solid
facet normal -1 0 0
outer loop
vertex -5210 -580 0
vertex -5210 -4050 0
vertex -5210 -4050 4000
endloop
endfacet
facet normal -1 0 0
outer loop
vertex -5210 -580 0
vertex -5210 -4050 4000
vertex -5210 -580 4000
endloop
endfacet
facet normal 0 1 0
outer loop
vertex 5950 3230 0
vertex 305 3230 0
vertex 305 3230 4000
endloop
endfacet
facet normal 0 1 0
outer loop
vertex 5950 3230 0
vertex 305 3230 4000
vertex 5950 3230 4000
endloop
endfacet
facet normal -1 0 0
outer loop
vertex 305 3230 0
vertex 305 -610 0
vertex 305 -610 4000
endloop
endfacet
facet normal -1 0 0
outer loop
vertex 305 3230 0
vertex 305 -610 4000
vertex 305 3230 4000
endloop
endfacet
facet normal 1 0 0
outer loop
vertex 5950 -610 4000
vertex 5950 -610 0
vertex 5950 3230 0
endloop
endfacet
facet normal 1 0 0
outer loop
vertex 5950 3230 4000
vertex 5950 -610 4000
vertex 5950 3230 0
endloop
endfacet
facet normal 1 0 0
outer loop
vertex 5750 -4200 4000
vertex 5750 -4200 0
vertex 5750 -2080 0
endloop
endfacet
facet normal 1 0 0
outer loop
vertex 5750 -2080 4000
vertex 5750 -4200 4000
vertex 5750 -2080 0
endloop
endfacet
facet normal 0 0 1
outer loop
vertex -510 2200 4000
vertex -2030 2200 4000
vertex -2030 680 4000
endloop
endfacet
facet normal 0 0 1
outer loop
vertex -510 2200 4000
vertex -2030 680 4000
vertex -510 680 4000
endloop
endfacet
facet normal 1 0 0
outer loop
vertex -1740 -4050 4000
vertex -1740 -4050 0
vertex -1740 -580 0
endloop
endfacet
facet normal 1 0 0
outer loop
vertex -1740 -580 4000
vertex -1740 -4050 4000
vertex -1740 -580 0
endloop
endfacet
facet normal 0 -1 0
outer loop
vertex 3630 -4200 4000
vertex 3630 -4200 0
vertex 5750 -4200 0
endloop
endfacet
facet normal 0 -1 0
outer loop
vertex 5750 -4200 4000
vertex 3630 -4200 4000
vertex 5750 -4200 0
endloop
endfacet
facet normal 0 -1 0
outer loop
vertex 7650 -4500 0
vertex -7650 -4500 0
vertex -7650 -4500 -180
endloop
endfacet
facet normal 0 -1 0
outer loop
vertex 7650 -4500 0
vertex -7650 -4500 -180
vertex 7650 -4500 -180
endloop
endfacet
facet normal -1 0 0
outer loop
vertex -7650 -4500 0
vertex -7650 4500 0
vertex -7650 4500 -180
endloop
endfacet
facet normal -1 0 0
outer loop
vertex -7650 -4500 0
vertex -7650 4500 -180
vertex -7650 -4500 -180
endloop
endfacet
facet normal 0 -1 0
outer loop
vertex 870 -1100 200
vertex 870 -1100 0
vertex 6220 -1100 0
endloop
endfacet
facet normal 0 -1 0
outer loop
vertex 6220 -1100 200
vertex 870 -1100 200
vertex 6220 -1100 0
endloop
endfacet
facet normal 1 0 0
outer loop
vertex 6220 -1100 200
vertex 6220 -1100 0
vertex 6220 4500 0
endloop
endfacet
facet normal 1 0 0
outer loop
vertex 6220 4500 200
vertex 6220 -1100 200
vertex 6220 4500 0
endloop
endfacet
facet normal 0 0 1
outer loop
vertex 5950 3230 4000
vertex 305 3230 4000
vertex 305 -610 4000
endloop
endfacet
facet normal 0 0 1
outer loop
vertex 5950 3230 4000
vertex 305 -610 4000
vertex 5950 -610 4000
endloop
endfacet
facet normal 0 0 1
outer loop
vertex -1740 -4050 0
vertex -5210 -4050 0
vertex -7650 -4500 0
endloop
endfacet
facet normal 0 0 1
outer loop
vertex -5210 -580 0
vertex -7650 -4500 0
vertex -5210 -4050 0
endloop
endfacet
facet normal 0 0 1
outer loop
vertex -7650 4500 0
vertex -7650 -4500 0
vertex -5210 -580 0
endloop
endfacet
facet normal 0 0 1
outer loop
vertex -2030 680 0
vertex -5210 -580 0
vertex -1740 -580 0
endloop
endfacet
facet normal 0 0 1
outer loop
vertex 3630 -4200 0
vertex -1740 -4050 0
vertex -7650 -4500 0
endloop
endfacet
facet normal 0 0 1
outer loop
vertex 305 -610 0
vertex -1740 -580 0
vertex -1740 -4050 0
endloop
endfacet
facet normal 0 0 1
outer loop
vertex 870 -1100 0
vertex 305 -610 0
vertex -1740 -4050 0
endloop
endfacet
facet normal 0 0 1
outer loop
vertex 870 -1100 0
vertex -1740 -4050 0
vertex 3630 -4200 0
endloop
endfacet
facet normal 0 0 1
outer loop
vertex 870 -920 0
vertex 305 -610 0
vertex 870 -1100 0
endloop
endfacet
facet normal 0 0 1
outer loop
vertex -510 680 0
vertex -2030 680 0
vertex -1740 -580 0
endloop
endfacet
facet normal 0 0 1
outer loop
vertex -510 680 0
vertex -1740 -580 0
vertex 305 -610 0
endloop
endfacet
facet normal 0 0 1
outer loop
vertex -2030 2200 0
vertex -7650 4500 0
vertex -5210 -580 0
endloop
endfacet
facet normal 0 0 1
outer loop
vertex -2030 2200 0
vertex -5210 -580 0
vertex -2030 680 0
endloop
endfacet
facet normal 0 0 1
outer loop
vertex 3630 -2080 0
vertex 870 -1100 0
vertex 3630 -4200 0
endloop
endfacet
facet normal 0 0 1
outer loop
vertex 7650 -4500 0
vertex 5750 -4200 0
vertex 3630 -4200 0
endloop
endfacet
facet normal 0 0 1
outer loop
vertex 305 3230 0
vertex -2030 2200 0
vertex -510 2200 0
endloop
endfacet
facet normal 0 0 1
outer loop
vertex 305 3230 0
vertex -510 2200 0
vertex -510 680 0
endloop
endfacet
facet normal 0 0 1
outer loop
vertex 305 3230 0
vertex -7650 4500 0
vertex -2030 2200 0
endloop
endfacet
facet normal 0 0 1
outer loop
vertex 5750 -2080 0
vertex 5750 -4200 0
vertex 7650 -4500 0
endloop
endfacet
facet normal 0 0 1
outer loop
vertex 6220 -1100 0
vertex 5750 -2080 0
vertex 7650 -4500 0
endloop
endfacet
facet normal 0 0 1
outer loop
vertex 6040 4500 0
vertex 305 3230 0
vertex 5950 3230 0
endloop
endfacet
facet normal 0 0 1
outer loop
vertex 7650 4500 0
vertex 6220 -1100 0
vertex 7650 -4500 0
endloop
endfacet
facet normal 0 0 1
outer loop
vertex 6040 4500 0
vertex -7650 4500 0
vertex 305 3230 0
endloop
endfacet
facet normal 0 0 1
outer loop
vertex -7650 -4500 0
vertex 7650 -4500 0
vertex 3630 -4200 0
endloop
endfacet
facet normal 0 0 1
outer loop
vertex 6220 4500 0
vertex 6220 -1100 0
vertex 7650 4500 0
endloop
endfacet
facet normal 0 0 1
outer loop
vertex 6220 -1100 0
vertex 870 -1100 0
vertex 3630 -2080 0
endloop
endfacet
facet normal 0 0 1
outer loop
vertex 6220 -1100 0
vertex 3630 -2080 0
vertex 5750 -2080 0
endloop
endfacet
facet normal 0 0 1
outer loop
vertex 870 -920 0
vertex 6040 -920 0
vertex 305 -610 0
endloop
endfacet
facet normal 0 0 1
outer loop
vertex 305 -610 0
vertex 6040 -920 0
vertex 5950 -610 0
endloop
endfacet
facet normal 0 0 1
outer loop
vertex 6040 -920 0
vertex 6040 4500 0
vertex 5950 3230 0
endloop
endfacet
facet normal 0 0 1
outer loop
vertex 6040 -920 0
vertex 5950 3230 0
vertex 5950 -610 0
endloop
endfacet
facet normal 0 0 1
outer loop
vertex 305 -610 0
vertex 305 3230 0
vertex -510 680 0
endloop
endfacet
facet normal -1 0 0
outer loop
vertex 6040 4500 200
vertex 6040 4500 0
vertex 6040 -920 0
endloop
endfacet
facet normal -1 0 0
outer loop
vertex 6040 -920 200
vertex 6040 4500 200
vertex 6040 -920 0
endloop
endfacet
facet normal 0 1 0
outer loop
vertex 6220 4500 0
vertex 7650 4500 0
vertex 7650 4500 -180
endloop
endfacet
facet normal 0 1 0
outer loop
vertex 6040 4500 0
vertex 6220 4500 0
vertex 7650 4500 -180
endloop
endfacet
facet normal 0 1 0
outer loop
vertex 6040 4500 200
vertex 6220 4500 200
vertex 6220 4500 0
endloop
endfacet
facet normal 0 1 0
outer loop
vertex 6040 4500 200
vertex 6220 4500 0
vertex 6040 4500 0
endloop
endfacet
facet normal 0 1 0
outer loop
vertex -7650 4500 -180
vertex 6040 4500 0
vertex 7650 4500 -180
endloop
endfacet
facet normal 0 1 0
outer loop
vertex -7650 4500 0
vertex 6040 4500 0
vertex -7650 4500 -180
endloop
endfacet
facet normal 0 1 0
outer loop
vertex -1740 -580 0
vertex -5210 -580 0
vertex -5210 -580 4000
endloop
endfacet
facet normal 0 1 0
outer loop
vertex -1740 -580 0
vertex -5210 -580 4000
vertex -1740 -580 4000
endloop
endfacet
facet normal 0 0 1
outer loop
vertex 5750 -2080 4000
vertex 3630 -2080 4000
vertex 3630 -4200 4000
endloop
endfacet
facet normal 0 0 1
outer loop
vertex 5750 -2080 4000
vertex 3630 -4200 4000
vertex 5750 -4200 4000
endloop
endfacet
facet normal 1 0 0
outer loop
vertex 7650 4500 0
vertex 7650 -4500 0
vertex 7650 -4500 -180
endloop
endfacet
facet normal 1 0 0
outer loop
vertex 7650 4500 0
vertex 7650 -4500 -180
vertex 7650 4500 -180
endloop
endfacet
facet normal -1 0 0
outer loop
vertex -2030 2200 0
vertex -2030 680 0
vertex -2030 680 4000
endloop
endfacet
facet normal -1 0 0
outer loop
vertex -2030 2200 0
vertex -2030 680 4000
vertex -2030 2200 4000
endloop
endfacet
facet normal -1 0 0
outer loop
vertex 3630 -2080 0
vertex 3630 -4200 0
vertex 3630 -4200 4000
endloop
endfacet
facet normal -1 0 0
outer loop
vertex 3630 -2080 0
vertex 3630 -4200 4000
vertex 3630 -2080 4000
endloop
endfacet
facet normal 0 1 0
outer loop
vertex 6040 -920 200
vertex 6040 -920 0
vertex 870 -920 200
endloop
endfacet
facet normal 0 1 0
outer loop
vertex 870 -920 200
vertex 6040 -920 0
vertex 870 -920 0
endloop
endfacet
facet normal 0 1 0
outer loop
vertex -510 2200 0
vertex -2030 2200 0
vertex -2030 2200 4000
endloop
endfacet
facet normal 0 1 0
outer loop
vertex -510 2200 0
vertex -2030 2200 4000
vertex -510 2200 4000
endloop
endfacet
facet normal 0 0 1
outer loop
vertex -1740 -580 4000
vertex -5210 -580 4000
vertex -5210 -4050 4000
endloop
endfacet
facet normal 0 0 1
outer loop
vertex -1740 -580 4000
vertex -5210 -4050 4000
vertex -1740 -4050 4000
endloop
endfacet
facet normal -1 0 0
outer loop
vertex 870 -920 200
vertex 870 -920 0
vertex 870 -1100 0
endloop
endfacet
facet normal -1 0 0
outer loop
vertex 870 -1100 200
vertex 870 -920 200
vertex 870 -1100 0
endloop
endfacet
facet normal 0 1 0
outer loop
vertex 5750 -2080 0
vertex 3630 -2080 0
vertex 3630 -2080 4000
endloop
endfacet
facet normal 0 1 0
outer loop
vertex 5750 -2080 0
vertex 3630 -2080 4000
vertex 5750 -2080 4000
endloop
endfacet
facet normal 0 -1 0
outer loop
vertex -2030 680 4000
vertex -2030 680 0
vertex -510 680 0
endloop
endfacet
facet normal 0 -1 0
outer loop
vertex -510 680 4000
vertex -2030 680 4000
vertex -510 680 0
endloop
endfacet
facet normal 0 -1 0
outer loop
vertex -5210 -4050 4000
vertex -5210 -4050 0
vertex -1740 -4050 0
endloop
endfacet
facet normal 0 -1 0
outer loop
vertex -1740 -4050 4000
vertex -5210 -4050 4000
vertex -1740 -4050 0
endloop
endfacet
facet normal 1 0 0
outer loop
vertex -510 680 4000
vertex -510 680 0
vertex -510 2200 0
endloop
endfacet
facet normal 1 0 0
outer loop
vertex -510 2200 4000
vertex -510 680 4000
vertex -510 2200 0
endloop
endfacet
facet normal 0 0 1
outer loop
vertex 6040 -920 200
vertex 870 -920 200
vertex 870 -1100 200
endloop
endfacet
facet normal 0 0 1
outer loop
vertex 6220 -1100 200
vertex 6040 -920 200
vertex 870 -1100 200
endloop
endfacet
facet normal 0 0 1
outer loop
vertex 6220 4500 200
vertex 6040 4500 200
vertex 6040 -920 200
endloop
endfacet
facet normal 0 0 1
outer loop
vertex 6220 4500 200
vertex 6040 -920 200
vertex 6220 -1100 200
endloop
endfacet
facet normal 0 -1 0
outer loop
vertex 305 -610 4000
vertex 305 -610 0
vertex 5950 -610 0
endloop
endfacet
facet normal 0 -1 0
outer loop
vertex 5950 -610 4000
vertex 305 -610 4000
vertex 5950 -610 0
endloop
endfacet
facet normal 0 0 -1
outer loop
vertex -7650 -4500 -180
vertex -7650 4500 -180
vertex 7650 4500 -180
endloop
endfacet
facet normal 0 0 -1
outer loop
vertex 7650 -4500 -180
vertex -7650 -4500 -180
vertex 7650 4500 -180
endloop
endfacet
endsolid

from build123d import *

# Parameters (mm, degrees)
F0_W     = 3470
F0_H     = 3470
F0_W_2   = 2120
F0_H_2   = 2120
F0_W_3   = 1520
F0_H_3   = 1520
F0_W_4   = 5645
F0_H_4   = 3840
F1_DEPTH = 180
F2_DEPTH = 4000
F3_DEPTH = 200


# Not quite as in the source:
# - a feature names something its author has since deleted; it is built from what else it names


with BuildPart() as f1:
    # F0 (on Top) → F1 (new body)
    with BuildSketch(Plane.XY):
        Polygon((-7650, 4500), (-7650, -4500), (7650, -4500), (7650, 4500), (6220, 4500), (6220, -1100), (870, -1100), (870, -920), (1050, -920), (6040, -920), (6040, 4500), align=None)
        with Locations((-3475, -2315)):
            Rectangle(F0_W, F0_H, mode=Mode.SUBTRACT)
        with Locations((4690, -3140)):
            Rectangle(F0_W_2, F0_H_2, mode=Mode.SUBTRACT)
        with Locations((-1270, 1440)):
            Rectangle(F0_W_3, F0_H_3, mode=Mode.SUBTRACT)
        with Locations((3127.5, 1310)):
            Rectangle(F0_W_4, F0_H_4, mode=Mode.SUBTRACT)
        Polygon((6220, 4500), (6040, 4500), (6040, -920), (1050, -920), (870, -920), (870, -1100), (6220, -1100), align=None)
        with Locations((-3475, -2315)):
            Rectangle(F0_W, F0_H)
        with Locations((-1270, 1440)):
            Rectangle(F0_W_3, F0_H_3)
        with Locations((4690, -3140)):
            Rectangle(F0_W_2, F0_H_2)
        with Locations((3127.5, 1310)):
            Rectangle(F0_W_4, F0_H_4)
    extrude(amount=-F1_DEPTH)

    # F0 (on Top) → F2 (join)
    with BuildSketch(Plane.XY):
        with Locations((-3475, -2315)):
            Rectangle(F0_W, F0_H)
        with Locations((-1270, 1440)):
            Rectangle(F0_W_3, F0_H_3)
        with Locations((4690, -3140)):
            Rectangle(F0_W_2, F0_H_2)
        with Locations((3127.5, 1310)):
            Rectangle(F0_W_4, F0_H_4)
    extrude(amount=F2_DEPTH)

    # F0 (on Top) → F3 (join)
    with BuildSketch(Plane.XY):
        Polygon((6220, 4500), (6040, 4500), (6040, -920), (1050, -920), (870, -920), (870, -1100), (6220, -1100), align=None)
    extrude(amount=F3_DEPTH)


solid = f1.part
